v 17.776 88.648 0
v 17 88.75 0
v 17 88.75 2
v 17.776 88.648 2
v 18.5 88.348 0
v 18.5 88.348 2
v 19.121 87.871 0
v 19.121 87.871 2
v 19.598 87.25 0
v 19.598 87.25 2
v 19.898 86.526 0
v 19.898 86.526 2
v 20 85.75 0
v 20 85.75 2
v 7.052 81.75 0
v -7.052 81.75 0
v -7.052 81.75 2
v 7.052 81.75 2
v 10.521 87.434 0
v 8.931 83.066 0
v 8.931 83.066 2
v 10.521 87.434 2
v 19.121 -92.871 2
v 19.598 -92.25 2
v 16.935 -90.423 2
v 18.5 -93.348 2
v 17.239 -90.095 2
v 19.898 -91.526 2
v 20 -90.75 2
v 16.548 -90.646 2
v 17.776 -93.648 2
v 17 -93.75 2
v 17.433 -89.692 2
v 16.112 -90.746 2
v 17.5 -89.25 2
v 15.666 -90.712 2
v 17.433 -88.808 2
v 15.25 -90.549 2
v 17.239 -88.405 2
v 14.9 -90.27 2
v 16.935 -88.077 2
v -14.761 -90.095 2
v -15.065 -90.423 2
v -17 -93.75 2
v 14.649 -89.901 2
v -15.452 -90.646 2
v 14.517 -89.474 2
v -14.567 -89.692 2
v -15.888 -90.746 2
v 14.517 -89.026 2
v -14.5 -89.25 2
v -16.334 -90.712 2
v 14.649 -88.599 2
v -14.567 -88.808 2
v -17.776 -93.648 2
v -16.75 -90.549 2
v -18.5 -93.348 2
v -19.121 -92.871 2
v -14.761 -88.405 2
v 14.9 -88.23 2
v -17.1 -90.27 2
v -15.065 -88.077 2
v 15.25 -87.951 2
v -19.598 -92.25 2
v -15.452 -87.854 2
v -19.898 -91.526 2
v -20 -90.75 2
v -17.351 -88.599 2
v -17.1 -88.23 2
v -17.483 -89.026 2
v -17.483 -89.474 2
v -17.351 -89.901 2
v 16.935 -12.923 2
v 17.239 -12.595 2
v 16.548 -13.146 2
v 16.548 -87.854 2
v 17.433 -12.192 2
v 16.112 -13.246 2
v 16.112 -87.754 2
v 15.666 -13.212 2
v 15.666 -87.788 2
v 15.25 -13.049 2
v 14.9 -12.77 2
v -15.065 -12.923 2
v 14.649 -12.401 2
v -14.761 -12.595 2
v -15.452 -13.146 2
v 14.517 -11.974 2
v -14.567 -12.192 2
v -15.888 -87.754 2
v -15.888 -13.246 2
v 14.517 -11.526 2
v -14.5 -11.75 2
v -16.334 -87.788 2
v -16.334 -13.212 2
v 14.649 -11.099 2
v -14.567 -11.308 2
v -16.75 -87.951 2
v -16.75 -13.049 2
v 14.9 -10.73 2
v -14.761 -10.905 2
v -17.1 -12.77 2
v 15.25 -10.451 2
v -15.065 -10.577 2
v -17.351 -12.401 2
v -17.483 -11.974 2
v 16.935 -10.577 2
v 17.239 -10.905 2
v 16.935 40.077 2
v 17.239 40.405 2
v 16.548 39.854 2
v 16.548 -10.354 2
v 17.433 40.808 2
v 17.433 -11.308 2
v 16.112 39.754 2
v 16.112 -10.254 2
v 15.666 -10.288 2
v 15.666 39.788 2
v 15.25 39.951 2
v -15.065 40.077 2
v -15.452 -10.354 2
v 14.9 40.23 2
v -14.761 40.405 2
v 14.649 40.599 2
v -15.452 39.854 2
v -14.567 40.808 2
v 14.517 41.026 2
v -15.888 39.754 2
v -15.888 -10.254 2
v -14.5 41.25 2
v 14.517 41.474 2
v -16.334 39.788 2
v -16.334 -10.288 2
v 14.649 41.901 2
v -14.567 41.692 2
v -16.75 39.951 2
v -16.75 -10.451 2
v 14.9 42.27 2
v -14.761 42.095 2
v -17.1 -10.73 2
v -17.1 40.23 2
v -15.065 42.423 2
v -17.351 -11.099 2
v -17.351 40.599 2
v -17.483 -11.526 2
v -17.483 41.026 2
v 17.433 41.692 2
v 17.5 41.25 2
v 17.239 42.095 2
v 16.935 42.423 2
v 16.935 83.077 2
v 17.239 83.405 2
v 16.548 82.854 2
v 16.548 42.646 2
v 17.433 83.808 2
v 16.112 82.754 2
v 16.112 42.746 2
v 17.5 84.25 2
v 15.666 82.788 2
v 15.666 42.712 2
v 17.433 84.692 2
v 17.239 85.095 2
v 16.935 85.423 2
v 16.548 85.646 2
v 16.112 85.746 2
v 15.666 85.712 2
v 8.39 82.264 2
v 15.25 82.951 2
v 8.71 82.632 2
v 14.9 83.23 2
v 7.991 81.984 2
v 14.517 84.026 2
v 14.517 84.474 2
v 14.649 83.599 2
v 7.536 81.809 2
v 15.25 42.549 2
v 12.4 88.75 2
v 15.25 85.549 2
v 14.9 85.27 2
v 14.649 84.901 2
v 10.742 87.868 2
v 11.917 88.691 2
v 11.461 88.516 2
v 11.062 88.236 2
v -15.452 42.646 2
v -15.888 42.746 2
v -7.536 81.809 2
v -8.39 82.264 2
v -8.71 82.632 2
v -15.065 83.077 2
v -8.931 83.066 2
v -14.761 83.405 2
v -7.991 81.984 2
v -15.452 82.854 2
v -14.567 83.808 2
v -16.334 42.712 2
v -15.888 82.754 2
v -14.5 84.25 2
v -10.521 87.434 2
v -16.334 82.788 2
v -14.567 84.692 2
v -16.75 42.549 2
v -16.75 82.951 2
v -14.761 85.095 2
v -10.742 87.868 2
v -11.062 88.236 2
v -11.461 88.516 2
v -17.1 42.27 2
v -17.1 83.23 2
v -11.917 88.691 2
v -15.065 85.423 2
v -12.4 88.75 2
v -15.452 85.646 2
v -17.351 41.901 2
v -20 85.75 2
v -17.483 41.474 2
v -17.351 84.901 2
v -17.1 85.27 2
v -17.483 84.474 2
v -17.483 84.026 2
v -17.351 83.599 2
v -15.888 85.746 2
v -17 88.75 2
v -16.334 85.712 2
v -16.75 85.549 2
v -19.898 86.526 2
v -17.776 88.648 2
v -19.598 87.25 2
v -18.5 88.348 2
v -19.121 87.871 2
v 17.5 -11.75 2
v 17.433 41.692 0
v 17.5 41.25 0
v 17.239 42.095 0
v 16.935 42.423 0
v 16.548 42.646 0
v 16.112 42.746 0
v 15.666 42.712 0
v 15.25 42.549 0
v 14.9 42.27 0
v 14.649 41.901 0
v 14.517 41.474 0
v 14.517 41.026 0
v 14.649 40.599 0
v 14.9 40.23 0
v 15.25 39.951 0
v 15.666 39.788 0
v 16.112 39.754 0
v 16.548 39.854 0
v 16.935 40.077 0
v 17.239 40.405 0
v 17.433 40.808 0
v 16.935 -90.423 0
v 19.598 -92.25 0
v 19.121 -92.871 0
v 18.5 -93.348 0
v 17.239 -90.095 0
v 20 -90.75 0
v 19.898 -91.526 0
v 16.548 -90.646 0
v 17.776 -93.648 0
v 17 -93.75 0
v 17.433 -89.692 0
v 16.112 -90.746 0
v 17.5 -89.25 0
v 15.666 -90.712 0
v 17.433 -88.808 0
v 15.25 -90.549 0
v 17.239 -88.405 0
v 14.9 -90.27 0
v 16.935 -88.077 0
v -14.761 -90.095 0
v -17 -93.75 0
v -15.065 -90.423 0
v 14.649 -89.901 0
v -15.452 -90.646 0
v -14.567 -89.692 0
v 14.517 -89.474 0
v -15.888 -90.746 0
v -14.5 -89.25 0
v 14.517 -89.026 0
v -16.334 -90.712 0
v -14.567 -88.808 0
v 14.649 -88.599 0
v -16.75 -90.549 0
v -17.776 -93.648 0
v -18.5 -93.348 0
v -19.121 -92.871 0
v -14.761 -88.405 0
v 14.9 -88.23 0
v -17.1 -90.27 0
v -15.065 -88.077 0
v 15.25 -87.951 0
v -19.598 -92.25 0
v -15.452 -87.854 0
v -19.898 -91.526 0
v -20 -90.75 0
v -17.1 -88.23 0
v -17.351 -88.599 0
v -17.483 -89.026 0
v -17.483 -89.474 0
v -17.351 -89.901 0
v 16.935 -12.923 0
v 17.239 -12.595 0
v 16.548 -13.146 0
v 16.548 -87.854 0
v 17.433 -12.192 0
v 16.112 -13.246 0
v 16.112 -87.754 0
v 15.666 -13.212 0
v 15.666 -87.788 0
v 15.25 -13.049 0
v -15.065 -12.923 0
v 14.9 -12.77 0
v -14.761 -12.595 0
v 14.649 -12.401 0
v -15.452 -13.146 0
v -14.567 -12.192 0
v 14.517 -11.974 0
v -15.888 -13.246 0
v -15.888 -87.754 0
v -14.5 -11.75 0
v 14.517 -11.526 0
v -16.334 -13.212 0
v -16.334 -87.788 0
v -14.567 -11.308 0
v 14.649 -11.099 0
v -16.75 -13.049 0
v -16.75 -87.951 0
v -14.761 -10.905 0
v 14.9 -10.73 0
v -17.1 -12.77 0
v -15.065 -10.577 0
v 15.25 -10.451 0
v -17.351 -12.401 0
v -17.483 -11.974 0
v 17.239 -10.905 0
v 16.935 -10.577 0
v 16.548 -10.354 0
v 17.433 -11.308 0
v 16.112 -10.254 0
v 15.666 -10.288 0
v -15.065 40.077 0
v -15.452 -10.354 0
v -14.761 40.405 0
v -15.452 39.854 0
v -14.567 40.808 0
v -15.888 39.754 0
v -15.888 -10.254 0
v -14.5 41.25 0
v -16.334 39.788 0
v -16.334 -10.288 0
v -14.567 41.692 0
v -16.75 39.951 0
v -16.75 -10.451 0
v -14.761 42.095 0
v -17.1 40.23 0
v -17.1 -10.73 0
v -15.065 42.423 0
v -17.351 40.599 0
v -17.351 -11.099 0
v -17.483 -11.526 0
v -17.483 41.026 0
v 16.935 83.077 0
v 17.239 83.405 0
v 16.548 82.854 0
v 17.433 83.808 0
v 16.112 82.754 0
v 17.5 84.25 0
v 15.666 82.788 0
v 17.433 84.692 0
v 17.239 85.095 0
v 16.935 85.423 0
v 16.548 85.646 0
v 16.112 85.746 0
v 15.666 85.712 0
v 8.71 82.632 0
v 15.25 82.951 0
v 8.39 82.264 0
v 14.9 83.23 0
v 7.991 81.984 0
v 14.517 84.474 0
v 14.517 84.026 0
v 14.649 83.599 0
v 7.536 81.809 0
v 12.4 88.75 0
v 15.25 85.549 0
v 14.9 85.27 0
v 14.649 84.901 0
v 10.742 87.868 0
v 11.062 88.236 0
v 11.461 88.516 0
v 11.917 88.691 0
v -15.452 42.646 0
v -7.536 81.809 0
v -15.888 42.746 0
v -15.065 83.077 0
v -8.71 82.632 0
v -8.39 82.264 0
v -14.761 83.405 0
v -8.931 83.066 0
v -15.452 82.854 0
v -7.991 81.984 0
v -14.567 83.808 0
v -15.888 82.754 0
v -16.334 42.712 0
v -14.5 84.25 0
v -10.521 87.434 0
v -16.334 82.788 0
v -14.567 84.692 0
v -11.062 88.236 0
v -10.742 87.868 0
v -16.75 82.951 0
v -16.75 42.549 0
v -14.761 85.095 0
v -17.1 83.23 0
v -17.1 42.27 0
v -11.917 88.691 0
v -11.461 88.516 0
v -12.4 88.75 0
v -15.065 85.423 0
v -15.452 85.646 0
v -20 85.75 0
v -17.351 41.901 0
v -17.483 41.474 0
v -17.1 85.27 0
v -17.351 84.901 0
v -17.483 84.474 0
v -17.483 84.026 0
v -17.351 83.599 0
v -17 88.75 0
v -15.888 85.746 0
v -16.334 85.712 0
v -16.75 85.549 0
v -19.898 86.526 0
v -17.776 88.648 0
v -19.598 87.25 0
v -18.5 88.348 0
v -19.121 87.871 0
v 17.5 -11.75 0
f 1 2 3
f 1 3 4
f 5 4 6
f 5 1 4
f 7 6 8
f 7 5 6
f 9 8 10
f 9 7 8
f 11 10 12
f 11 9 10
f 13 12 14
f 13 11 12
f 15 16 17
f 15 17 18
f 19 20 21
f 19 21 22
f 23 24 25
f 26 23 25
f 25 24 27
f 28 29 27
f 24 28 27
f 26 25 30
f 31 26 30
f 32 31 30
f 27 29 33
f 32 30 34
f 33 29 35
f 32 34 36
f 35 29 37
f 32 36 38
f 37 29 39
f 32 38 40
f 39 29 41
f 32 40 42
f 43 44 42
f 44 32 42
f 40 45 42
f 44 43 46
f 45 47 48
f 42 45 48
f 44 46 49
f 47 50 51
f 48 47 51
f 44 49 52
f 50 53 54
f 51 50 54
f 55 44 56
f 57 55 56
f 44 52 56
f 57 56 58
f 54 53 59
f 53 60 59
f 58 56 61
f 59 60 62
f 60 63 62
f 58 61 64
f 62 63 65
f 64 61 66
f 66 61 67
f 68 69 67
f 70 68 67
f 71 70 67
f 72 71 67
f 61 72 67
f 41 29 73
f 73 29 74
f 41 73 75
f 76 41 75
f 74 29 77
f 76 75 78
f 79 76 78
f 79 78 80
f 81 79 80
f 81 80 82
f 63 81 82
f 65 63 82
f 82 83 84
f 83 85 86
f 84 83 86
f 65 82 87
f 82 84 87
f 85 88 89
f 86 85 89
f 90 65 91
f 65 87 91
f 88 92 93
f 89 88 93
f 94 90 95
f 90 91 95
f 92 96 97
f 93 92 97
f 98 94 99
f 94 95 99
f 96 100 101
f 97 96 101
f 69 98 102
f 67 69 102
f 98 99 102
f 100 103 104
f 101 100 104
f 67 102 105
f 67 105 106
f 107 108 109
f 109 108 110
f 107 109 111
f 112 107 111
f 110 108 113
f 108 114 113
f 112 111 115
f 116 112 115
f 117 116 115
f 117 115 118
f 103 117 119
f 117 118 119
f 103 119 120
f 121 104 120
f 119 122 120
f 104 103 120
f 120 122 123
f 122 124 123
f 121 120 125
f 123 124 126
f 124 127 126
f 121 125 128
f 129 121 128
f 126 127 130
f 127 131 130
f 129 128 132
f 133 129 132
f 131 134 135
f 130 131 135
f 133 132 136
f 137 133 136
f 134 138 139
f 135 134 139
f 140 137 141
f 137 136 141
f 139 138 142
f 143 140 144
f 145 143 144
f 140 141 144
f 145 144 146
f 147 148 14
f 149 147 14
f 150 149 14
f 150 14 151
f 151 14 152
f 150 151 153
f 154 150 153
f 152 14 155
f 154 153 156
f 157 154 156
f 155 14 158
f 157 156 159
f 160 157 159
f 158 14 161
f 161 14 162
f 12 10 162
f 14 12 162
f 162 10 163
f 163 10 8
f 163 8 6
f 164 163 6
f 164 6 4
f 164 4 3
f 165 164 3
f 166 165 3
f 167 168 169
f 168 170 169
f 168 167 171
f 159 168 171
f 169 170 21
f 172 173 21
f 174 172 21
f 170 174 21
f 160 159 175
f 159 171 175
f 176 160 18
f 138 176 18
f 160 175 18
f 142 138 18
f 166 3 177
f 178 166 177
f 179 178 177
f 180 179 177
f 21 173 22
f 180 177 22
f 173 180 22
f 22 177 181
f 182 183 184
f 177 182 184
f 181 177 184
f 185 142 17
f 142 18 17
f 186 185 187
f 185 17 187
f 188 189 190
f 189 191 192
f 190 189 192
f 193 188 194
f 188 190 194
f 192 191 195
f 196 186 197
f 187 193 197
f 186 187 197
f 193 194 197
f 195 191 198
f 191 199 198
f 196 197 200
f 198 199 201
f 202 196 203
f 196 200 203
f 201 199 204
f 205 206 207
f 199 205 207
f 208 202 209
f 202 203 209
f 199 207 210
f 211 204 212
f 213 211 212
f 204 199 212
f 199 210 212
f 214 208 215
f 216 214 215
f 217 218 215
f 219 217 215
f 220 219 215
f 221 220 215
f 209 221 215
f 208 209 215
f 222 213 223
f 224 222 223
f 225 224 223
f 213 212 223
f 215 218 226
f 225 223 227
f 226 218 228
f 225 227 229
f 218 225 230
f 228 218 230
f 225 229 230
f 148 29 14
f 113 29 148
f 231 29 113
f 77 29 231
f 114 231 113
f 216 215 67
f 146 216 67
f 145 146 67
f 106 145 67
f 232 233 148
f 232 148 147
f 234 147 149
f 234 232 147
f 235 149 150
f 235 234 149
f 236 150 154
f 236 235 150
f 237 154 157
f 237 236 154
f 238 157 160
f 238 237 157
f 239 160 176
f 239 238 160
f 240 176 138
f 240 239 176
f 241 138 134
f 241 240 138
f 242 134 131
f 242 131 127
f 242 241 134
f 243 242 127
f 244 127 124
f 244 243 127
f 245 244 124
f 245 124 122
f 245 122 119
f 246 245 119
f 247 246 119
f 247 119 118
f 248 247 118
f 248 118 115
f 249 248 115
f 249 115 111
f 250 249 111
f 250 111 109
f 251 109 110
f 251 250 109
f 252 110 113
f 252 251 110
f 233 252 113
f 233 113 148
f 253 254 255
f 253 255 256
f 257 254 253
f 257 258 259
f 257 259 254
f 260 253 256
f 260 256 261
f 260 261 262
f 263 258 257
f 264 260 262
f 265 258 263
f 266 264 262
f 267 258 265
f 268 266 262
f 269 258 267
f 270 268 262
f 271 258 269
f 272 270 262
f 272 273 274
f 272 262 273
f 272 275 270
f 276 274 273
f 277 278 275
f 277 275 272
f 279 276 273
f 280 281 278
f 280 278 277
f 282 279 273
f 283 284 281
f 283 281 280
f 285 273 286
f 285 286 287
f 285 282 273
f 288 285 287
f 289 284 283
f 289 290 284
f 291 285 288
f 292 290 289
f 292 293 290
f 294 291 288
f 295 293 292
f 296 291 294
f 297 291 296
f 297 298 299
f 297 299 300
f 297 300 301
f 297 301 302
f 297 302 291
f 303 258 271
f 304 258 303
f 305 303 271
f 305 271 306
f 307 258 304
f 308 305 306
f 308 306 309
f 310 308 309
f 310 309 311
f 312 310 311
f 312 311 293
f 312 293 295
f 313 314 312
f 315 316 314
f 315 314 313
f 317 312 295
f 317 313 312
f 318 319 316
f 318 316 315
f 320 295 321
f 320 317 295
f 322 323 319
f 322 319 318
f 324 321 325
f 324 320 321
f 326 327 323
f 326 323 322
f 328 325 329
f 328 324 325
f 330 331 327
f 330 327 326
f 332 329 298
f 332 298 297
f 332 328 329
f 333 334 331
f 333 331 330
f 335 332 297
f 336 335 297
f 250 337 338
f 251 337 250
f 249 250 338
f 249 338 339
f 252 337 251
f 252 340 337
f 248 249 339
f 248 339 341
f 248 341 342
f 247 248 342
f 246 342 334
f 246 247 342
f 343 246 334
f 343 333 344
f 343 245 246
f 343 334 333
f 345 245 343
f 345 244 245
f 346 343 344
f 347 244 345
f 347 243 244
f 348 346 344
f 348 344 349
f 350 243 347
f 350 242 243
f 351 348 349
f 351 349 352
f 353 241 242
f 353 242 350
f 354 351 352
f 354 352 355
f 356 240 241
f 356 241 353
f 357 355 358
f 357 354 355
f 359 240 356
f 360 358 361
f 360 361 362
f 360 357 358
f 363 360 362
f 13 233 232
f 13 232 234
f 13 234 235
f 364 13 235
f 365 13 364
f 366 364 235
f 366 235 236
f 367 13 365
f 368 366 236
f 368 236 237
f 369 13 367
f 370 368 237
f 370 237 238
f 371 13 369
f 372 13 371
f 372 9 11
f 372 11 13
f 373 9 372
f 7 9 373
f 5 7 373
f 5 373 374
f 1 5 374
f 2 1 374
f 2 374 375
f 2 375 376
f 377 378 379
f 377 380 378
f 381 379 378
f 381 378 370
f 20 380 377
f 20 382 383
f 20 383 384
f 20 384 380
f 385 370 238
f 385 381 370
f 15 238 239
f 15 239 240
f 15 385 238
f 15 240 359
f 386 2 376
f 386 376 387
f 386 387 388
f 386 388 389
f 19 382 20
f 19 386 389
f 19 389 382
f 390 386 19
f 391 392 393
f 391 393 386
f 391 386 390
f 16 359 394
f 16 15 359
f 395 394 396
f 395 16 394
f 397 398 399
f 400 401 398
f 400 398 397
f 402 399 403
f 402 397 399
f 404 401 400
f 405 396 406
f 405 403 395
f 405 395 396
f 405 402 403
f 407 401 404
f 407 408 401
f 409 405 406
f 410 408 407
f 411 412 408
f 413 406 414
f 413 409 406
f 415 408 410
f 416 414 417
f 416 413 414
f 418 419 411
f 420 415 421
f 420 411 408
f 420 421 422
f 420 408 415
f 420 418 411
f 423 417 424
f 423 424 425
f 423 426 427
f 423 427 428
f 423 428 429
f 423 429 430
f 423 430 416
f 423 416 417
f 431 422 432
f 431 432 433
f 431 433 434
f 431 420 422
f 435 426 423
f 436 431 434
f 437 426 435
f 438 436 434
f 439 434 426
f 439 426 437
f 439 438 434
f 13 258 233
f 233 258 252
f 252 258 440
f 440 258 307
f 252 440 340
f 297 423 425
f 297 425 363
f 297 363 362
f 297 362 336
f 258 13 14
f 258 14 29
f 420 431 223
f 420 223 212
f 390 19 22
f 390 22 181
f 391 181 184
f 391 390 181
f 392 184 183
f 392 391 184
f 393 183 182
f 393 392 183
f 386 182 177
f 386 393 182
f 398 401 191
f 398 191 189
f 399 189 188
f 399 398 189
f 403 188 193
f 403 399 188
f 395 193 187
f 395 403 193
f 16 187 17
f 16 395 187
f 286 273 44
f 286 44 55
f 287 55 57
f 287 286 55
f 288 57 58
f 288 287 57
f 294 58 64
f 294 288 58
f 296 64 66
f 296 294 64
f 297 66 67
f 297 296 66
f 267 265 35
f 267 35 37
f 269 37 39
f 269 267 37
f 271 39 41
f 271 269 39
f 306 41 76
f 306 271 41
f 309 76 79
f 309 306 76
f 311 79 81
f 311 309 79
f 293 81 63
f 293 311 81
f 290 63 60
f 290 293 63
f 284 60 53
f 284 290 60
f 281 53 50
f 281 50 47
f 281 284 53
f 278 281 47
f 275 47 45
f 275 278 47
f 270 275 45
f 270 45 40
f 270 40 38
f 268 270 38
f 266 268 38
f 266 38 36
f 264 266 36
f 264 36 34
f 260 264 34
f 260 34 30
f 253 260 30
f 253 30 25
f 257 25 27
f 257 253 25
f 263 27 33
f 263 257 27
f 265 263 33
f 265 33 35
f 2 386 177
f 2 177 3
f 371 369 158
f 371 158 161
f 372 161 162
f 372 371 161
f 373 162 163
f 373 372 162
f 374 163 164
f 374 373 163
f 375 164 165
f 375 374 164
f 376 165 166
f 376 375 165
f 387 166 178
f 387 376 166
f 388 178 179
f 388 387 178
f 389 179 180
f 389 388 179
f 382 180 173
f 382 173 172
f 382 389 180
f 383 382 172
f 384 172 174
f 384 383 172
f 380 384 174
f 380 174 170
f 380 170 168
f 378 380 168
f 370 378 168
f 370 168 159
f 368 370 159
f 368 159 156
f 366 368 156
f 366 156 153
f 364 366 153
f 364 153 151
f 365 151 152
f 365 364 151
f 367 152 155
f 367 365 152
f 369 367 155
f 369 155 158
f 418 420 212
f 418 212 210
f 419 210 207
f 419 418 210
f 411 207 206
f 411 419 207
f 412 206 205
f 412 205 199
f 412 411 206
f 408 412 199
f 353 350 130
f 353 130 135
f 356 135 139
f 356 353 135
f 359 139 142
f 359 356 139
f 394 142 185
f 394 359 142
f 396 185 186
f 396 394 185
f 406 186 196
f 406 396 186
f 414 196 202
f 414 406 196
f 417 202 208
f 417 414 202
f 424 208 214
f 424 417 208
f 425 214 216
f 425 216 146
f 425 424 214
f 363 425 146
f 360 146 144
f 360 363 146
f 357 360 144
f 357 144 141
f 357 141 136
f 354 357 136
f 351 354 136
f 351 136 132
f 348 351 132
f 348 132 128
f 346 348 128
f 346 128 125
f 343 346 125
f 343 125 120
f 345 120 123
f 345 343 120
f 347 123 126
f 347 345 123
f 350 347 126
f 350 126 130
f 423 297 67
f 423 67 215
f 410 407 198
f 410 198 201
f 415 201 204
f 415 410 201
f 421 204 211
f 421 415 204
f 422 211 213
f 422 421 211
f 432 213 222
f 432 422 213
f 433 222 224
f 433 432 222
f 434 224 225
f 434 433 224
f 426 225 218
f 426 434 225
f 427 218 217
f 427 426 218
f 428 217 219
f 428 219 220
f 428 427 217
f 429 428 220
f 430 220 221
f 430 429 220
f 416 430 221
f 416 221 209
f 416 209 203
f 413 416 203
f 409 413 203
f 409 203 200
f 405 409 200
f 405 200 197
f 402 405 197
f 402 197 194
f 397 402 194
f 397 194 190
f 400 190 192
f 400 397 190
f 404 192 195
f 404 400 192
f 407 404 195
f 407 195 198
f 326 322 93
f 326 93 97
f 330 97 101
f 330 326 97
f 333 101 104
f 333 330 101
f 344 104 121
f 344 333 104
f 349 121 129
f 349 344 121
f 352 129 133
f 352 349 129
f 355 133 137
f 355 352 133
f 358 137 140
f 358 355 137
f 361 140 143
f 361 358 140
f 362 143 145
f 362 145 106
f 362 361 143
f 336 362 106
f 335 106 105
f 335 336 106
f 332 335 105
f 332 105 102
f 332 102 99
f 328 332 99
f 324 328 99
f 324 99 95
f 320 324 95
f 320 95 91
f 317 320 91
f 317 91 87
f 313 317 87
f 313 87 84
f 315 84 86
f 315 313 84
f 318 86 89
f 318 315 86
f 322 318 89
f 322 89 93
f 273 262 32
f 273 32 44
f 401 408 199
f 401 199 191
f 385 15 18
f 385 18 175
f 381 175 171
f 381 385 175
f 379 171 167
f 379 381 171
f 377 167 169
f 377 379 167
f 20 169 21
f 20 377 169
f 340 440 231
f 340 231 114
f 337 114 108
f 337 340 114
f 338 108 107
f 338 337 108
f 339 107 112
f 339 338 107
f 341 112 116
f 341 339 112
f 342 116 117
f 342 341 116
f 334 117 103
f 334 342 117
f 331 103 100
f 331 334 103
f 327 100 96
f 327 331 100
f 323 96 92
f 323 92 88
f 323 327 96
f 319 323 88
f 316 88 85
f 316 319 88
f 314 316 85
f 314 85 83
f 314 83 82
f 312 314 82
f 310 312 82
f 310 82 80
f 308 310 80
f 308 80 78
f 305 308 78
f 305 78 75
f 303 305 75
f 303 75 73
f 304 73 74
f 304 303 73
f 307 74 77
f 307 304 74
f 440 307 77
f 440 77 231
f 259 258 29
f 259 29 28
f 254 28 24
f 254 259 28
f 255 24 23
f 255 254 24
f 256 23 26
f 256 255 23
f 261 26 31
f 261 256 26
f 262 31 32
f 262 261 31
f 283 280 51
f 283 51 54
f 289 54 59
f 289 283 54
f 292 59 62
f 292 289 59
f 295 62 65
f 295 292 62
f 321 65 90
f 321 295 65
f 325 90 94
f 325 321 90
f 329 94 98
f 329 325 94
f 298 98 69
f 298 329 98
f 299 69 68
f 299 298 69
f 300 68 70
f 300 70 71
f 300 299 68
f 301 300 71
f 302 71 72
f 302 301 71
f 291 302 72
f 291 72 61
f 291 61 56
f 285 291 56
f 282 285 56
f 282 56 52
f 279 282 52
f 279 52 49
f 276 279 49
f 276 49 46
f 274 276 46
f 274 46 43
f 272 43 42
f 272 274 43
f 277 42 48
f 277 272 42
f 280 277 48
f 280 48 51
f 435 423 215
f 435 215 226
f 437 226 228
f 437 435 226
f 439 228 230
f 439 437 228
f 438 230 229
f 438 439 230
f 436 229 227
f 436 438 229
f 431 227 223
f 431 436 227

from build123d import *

# Parameters (mm, degrees)
CROQUIS1_R                 = 1.5
SALIENTE_EXTRUIR1_DEPTH    = 2
CORTAR_EXTRUIR1_DEPTH      = 96.880459427
CORTAR_EXTRUIR1_DEPTH_BACK = 2


with BuildPart() as part:
    # Croquis1 → Saliente-Extruir1 (new body)
    with BuildSketch(Plane.XY):
        with BuildLine():
            Line((-17, 88.75), (17, 88.75))
            ThreePointArc((17, 88.75), (19.121320344, 87.871320344), (20, 85.75))
            Line((20, 85.75), (20, -90.75))
            ThreePointArc((20, -90.75), (19.121320344, -92.871320344), (17, -93.75))
            Line((17, -93.75), (-17, -93.75))
            ThreePointArc((-17, -93.75), (-19.121320344, -92.871320344), (-20, -90.75))
            Line((-20, -90.75), (-20, 85.75))
            ThreePointArc((-20, 85.75), (-19.121320344, 87.871320344), (-17, 88.75))
        make_face()
        with Locations((-16, 84.25)):
            Circle(CROQUIS1_R, mode=Mode.SUBTRACT)
        with Locations((16, 84.25)):
            Circle(CROQUIS1_R, mode=Mode.SUBTRACT)
        with Locations((-16, 41.25)):
            Circle(CROQUIS1_R, mode=Mode.SUBTRACT)
        with Locations((16, 41.25)):
            Circle(CROQUIS1_R, mode=Mode.SUBTRACT)
        with Locations((-16, -11.75)):
            Circle(CROQUIS1_R, mode=Mode.SUBTRACT)
        with Locations((16, -11.75)):
            Circle(CROQUIS1_R, mode=Mode.SUBTRACT)
        with Locations((-16, -89.25)):
            Circle(CROQUIS1_R, mode=Mode.SUBTRACT)
        with Locations((16, -89.25)):
            Circle(CROQUIS1_R, mode=Mode.SUBTRACT)
    extrude(amount=SALIENTE_EXTRUIR1_DEPTH)

    # Croquis2 → Cortar-Extruir1 (cut, two sides: drawn at the far end of the back side and taken through both)
    with BuildSketch(Plane.XY.offset(2).offset(-CORTAR_EXTRUIR1_DEPTH_BACK)):
        with BuildLine():
            ThreePointArc((-12.400415076, 88.75), (-11.253262204, 88.388304089), (-10.521029835, 87.434040287))
            Line((-10.521029835, 87.434040287), (-8.931178525, 83.065959713))
            ThreePointArc((-8.931178525, 83.065959713), (-8.198946156, 82.111695911), (-7.051793284, 81.75))
            Line((-7.051793284, 81.75), (7.051793284, 81.75))
            ThreePointArc((7.051793284, 81.75), (8.198946156, 82.111695911), (8.931178525, 83.065959713))
            Line((8.931178525, 83.065959713), (10.521029835, 87.434040287))
            ThreePointArc((10.521029835, 87.434040287), (11.253262204, 88.388304089), (12.400415076, 88.75))
            Line((12.400415076, 88.75), (-12.400415076, 88.75))
        make_face()
    extrude(amount=CORTAR_EXTRUIR1_DEPTH + CORTAR_EXTRUIR1_DEPTH_BACK, mode=Mode.SUBTRACT)


solid = part.part
